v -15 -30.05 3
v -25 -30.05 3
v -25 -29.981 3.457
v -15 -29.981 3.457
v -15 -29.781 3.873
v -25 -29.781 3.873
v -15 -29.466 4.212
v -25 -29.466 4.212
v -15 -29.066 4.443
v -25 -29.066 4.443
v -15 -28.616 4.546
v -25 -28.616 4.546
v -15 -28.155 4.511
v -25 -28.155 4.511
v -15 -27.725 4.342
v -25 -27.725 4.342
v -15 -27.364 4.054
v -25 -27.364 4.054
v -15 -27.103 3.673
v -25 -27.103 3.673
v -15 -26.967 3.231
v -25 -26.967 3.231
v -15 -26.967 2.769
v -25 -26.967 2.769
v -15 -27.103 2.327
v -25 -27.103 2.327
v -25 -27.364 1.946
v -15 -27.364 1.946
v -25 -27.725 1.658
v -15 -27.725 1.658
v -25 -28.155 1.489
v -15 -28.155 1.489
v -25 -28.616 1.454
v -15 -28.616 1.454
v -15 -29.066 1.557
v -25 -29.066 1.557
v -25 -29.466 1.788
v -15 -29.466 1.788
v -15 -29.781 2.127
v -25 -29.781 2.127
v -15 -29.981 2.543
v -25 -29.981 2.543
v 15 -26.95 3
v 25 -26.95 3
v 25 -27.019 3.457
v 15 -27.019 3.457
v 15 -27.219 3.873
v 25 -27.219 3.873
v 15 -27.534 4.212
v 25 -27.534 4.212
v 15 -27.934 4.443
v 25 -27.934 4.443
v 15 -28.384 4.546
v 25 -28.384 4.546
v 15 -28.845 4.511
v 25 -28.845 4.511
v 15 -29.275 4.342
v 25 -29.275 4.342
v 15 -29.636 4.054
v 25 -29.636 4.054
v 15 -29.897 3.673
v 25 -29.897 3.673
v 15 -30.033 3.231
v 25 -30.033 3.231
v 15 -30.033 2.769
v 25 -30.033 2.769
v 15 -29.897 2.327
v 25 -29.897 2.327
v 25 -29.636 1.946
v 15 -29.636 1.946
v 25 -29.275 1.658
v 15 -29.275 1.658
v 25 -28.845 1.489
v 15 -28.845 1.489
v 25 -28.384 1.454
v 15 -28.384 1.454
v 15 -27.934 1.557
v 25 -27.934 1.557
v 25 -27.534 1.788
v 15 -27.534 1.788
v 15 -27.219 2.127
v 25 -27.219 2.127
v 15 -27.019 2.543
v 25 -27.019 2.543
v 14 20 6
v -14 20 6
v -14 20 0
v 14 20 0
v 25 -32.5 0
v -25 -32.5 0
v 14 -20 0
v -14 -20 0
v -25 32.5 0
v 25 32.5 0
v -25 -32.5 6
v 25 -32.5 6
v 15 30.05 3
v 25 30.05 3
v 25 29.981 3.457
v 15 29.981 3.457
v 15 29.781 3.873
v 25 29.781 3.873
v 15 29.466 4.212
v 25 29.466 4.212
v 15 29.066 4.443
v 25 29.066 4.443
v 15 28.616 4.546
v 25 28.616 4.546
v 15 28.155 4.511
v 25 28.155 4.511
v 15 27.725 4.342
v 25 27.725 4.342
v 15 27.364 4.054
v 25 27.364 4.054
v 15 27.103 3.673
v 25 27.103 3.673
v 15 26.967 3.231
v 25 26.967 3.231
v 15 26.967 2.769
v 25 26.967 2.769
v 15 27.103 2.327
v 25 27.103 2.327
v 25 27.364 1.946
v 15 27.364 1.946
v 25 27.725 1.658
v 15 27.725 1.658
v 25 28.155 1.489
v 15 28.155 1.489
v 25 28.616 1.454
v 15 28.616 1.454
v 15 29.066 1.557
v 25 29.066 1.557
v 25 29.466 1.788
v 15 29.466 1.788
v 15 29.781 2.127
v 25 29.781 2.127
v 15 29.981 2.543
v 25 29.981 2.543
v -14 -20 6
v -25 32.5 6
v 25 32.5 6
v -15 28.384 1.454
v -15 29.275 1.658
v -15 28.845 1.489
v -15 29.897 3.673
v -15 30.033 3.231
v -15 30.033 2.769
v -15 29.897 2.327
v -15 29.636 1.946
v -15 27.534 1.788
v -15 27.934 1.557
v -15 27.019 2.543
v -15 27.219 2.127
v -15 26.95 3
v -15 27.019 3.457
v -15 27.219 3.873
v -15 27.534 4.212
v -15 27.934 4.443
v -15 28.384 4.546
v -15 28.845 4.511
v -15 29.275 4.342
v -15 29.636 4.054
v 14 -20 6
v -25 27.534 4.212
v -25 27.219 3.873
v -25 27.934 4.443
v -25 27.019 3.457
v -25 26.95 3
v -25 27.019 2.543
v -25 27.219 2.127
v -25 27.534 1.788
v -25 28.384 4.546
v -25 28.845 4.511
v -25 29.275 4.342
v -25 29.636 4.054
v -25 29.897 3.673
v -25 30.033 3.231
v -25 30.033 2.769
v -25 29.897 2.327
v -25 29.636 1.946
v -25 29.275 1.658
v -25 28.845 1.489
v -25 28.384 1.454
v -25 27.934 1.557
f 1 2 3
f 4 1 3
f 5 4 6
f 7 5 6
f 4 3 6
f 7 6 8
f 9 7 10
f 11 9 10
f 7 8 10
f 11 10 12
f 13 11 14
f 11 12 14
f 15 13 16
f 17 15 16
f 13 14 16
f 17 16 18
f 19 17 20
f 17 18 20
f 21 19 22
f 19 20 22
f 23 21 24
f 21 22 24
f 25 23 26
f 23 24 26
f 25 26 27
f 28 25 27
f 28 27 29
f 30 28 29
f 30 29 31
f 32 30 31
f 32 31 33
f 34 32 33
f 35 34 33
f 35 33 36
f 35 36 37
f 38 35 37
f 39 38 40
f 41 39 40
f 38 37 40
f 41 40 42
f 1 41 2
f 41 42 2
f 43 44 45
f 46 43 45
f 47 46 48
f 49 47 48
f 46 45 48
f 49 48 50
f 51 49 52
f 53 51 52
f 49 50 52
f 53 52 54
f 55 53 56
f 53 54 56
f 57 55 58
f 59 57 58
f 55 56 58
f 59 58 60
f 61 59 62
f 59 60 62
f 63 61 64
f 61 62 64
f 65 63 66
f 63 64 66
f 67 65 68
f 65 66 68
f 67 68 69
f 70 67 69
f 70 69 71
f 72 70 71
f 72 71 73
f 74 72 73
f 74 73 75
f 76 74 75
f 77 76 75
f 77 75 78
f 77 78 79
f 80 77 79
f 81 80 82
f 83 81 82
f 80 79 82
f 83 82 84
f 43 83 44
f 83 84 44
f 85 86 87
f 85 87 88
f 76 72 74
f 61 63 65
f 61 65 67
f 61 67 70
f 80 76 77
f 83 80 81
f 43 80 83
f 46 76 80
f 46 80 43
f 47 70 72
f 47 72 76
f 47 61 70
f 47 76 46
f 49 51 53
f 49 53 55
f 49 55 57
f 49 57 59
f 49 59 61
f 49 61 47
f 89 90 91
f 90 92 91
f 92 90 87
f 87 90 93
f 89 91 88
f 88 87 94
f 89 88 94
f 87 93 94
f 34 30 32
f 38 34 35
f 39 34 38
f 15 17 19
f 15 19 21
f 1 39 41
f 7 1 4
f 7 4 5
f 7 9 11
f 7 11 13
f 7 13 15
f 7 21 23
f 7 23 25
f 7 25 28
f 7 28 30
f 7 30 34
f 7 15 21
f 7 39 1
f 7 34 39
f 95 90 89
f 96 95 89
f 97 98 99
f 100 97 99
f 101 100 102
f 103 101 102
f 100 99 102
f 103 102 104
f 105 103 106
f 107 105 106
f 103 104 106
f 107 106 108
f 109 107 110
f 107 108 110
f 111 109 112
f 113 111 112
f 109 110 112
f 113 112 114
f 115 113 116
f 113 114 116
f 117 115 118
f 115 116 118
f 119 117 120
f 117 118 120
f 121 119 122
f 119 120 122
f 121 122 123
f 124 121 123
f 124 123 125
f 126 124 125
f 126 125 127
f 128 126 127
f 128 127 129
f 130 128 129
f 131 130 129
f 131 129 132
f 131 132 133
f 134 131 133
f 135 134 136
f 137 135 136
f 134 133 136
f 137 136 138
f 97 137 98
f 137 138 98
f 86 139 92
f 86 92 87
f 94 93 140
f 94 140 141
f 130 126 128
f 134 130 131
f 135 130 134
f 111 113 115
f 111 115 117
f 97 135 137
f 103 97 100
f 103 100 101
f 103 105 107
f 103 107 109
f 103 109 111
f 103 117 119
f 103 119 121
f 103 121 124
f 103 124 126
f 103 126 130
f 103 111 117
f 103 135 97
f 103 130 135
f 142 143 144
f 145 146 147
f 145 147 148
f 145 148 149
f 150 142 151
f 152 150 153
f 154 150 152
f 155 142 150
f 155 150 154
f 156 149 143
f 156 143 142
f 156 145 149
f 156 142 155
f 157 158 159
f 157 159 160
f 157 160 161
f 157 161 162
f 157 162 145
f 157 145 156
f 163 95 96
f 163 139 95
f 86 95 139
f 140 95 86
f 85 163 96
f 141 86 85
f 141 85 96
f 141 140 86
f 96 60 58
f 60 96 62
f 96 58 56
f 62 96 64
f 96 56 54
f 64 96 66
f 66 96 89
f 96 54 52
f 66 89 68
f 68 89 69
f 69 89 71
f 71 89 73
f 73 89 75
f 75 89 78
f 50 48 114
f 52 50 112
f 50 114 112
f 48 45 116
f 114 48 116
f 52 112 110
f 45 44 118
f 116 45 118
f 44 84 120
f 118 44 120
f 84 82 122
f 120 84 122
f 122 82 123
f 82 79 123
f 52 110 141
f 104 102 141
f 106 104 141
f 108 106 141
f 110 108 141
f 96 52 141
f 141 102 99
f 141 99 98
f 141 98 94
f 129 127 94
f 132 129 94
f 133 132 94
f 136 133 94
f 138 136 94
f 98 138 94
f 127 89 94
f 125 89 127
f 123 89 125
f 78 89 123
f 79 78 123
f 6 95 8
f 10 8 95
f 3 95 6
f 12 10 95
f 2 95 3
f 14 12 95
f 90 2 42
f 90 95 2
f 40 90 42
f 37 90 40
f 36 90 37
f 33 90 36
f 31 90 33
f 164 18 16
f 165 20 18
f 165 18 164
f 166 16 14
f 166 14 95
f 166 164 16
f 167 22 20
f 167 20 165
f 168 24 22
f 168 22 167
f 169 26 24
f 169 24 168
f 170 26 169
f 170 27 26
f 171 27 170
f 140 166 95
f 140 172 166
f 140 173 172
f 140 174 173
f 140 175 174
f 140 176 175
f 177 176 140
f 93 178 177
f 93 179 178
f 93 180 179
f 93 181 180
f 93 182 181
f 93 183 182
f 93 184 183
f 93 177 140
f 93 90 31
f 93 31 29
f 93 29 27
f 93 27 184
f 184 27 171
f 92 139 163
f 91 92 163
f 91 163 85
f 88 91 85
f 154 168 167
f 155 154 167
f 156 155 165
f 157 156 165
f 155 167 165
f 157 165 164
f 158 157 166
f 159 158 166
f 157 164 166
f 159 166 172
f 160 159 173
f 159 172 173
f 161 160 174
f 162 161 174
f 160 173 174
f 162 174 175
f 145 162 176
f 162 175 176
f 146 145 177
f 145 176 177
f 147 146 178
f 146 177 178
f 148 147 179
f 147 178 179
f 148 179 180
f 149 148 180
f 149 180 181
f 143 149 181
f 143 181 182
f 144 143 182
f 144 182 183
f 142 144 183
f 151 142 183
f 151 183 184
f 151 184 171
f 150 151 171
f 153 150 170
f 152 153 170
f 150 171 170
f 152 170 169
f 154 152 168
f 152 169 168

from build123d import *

# Parameters (mm, degrees)
F0_W     = 50
F0_H     = 65
F1_DEPTH = 6
F2_W     = 28
F2_H     = 40
F3_DEPTH = 25
F4_R     = 1.55
F5_DEPTH = 10
F6_R     = 1.55
F7_DEPTH = 10


with BuildPart() as f1:
    # F0 (on Top) → F1 (new body)
    with BuildSketch(Plane.XY):
        Rectangle(F0_W, F0_H)
    extrude(amount=F1_DEPTH)

    # F2 (on face) → F3 (cut)
    with BuildSketch(Plane.XY.offset(6)):
        Rectangle(F2_W, F2_H)
    extrude(amount=-F3_DEPTH, mode=Mode.SUBTRACT)

    # F4 (on face) → F5 (cut)
    with BuildSketch(Plane.YZ.offset(25)):
        with BuildLine():
            ThreePointArc((-30.05, 3), (-28.5, 1.45), (-26.95, 3))
            ThreePointArc((-26.95, 3), (-28.5, 4.55), (-30.05, 3))
        make_face()
        with Locations((28.5, 3)):
            Circle(F4_R)
    extrude(amount=-F5_DEPTH, mode=Mode.SUBTRACT)

    # F6 (on face) → F7 (cut)
    with BuildSketch(Plane(origin=(-25, 0, 0), x_dir=(0, -1, 0), z_dir=(-1, 0, 0))):
        with BuildLine():
            ThreePointArc((-30.05, 3), (-28.5, 1.45), (-26.95, 3))
            ThreePointArc((-26.95, 3), (-28.5, 4.55), (-30.05, 3))
        make_face()
        with Locations((28.5, 3)):
            Circle(F6_R)
    extrude(amount=-F7_DEPTH, mode=Mode.SUBTRACT)


solid = f1.part
